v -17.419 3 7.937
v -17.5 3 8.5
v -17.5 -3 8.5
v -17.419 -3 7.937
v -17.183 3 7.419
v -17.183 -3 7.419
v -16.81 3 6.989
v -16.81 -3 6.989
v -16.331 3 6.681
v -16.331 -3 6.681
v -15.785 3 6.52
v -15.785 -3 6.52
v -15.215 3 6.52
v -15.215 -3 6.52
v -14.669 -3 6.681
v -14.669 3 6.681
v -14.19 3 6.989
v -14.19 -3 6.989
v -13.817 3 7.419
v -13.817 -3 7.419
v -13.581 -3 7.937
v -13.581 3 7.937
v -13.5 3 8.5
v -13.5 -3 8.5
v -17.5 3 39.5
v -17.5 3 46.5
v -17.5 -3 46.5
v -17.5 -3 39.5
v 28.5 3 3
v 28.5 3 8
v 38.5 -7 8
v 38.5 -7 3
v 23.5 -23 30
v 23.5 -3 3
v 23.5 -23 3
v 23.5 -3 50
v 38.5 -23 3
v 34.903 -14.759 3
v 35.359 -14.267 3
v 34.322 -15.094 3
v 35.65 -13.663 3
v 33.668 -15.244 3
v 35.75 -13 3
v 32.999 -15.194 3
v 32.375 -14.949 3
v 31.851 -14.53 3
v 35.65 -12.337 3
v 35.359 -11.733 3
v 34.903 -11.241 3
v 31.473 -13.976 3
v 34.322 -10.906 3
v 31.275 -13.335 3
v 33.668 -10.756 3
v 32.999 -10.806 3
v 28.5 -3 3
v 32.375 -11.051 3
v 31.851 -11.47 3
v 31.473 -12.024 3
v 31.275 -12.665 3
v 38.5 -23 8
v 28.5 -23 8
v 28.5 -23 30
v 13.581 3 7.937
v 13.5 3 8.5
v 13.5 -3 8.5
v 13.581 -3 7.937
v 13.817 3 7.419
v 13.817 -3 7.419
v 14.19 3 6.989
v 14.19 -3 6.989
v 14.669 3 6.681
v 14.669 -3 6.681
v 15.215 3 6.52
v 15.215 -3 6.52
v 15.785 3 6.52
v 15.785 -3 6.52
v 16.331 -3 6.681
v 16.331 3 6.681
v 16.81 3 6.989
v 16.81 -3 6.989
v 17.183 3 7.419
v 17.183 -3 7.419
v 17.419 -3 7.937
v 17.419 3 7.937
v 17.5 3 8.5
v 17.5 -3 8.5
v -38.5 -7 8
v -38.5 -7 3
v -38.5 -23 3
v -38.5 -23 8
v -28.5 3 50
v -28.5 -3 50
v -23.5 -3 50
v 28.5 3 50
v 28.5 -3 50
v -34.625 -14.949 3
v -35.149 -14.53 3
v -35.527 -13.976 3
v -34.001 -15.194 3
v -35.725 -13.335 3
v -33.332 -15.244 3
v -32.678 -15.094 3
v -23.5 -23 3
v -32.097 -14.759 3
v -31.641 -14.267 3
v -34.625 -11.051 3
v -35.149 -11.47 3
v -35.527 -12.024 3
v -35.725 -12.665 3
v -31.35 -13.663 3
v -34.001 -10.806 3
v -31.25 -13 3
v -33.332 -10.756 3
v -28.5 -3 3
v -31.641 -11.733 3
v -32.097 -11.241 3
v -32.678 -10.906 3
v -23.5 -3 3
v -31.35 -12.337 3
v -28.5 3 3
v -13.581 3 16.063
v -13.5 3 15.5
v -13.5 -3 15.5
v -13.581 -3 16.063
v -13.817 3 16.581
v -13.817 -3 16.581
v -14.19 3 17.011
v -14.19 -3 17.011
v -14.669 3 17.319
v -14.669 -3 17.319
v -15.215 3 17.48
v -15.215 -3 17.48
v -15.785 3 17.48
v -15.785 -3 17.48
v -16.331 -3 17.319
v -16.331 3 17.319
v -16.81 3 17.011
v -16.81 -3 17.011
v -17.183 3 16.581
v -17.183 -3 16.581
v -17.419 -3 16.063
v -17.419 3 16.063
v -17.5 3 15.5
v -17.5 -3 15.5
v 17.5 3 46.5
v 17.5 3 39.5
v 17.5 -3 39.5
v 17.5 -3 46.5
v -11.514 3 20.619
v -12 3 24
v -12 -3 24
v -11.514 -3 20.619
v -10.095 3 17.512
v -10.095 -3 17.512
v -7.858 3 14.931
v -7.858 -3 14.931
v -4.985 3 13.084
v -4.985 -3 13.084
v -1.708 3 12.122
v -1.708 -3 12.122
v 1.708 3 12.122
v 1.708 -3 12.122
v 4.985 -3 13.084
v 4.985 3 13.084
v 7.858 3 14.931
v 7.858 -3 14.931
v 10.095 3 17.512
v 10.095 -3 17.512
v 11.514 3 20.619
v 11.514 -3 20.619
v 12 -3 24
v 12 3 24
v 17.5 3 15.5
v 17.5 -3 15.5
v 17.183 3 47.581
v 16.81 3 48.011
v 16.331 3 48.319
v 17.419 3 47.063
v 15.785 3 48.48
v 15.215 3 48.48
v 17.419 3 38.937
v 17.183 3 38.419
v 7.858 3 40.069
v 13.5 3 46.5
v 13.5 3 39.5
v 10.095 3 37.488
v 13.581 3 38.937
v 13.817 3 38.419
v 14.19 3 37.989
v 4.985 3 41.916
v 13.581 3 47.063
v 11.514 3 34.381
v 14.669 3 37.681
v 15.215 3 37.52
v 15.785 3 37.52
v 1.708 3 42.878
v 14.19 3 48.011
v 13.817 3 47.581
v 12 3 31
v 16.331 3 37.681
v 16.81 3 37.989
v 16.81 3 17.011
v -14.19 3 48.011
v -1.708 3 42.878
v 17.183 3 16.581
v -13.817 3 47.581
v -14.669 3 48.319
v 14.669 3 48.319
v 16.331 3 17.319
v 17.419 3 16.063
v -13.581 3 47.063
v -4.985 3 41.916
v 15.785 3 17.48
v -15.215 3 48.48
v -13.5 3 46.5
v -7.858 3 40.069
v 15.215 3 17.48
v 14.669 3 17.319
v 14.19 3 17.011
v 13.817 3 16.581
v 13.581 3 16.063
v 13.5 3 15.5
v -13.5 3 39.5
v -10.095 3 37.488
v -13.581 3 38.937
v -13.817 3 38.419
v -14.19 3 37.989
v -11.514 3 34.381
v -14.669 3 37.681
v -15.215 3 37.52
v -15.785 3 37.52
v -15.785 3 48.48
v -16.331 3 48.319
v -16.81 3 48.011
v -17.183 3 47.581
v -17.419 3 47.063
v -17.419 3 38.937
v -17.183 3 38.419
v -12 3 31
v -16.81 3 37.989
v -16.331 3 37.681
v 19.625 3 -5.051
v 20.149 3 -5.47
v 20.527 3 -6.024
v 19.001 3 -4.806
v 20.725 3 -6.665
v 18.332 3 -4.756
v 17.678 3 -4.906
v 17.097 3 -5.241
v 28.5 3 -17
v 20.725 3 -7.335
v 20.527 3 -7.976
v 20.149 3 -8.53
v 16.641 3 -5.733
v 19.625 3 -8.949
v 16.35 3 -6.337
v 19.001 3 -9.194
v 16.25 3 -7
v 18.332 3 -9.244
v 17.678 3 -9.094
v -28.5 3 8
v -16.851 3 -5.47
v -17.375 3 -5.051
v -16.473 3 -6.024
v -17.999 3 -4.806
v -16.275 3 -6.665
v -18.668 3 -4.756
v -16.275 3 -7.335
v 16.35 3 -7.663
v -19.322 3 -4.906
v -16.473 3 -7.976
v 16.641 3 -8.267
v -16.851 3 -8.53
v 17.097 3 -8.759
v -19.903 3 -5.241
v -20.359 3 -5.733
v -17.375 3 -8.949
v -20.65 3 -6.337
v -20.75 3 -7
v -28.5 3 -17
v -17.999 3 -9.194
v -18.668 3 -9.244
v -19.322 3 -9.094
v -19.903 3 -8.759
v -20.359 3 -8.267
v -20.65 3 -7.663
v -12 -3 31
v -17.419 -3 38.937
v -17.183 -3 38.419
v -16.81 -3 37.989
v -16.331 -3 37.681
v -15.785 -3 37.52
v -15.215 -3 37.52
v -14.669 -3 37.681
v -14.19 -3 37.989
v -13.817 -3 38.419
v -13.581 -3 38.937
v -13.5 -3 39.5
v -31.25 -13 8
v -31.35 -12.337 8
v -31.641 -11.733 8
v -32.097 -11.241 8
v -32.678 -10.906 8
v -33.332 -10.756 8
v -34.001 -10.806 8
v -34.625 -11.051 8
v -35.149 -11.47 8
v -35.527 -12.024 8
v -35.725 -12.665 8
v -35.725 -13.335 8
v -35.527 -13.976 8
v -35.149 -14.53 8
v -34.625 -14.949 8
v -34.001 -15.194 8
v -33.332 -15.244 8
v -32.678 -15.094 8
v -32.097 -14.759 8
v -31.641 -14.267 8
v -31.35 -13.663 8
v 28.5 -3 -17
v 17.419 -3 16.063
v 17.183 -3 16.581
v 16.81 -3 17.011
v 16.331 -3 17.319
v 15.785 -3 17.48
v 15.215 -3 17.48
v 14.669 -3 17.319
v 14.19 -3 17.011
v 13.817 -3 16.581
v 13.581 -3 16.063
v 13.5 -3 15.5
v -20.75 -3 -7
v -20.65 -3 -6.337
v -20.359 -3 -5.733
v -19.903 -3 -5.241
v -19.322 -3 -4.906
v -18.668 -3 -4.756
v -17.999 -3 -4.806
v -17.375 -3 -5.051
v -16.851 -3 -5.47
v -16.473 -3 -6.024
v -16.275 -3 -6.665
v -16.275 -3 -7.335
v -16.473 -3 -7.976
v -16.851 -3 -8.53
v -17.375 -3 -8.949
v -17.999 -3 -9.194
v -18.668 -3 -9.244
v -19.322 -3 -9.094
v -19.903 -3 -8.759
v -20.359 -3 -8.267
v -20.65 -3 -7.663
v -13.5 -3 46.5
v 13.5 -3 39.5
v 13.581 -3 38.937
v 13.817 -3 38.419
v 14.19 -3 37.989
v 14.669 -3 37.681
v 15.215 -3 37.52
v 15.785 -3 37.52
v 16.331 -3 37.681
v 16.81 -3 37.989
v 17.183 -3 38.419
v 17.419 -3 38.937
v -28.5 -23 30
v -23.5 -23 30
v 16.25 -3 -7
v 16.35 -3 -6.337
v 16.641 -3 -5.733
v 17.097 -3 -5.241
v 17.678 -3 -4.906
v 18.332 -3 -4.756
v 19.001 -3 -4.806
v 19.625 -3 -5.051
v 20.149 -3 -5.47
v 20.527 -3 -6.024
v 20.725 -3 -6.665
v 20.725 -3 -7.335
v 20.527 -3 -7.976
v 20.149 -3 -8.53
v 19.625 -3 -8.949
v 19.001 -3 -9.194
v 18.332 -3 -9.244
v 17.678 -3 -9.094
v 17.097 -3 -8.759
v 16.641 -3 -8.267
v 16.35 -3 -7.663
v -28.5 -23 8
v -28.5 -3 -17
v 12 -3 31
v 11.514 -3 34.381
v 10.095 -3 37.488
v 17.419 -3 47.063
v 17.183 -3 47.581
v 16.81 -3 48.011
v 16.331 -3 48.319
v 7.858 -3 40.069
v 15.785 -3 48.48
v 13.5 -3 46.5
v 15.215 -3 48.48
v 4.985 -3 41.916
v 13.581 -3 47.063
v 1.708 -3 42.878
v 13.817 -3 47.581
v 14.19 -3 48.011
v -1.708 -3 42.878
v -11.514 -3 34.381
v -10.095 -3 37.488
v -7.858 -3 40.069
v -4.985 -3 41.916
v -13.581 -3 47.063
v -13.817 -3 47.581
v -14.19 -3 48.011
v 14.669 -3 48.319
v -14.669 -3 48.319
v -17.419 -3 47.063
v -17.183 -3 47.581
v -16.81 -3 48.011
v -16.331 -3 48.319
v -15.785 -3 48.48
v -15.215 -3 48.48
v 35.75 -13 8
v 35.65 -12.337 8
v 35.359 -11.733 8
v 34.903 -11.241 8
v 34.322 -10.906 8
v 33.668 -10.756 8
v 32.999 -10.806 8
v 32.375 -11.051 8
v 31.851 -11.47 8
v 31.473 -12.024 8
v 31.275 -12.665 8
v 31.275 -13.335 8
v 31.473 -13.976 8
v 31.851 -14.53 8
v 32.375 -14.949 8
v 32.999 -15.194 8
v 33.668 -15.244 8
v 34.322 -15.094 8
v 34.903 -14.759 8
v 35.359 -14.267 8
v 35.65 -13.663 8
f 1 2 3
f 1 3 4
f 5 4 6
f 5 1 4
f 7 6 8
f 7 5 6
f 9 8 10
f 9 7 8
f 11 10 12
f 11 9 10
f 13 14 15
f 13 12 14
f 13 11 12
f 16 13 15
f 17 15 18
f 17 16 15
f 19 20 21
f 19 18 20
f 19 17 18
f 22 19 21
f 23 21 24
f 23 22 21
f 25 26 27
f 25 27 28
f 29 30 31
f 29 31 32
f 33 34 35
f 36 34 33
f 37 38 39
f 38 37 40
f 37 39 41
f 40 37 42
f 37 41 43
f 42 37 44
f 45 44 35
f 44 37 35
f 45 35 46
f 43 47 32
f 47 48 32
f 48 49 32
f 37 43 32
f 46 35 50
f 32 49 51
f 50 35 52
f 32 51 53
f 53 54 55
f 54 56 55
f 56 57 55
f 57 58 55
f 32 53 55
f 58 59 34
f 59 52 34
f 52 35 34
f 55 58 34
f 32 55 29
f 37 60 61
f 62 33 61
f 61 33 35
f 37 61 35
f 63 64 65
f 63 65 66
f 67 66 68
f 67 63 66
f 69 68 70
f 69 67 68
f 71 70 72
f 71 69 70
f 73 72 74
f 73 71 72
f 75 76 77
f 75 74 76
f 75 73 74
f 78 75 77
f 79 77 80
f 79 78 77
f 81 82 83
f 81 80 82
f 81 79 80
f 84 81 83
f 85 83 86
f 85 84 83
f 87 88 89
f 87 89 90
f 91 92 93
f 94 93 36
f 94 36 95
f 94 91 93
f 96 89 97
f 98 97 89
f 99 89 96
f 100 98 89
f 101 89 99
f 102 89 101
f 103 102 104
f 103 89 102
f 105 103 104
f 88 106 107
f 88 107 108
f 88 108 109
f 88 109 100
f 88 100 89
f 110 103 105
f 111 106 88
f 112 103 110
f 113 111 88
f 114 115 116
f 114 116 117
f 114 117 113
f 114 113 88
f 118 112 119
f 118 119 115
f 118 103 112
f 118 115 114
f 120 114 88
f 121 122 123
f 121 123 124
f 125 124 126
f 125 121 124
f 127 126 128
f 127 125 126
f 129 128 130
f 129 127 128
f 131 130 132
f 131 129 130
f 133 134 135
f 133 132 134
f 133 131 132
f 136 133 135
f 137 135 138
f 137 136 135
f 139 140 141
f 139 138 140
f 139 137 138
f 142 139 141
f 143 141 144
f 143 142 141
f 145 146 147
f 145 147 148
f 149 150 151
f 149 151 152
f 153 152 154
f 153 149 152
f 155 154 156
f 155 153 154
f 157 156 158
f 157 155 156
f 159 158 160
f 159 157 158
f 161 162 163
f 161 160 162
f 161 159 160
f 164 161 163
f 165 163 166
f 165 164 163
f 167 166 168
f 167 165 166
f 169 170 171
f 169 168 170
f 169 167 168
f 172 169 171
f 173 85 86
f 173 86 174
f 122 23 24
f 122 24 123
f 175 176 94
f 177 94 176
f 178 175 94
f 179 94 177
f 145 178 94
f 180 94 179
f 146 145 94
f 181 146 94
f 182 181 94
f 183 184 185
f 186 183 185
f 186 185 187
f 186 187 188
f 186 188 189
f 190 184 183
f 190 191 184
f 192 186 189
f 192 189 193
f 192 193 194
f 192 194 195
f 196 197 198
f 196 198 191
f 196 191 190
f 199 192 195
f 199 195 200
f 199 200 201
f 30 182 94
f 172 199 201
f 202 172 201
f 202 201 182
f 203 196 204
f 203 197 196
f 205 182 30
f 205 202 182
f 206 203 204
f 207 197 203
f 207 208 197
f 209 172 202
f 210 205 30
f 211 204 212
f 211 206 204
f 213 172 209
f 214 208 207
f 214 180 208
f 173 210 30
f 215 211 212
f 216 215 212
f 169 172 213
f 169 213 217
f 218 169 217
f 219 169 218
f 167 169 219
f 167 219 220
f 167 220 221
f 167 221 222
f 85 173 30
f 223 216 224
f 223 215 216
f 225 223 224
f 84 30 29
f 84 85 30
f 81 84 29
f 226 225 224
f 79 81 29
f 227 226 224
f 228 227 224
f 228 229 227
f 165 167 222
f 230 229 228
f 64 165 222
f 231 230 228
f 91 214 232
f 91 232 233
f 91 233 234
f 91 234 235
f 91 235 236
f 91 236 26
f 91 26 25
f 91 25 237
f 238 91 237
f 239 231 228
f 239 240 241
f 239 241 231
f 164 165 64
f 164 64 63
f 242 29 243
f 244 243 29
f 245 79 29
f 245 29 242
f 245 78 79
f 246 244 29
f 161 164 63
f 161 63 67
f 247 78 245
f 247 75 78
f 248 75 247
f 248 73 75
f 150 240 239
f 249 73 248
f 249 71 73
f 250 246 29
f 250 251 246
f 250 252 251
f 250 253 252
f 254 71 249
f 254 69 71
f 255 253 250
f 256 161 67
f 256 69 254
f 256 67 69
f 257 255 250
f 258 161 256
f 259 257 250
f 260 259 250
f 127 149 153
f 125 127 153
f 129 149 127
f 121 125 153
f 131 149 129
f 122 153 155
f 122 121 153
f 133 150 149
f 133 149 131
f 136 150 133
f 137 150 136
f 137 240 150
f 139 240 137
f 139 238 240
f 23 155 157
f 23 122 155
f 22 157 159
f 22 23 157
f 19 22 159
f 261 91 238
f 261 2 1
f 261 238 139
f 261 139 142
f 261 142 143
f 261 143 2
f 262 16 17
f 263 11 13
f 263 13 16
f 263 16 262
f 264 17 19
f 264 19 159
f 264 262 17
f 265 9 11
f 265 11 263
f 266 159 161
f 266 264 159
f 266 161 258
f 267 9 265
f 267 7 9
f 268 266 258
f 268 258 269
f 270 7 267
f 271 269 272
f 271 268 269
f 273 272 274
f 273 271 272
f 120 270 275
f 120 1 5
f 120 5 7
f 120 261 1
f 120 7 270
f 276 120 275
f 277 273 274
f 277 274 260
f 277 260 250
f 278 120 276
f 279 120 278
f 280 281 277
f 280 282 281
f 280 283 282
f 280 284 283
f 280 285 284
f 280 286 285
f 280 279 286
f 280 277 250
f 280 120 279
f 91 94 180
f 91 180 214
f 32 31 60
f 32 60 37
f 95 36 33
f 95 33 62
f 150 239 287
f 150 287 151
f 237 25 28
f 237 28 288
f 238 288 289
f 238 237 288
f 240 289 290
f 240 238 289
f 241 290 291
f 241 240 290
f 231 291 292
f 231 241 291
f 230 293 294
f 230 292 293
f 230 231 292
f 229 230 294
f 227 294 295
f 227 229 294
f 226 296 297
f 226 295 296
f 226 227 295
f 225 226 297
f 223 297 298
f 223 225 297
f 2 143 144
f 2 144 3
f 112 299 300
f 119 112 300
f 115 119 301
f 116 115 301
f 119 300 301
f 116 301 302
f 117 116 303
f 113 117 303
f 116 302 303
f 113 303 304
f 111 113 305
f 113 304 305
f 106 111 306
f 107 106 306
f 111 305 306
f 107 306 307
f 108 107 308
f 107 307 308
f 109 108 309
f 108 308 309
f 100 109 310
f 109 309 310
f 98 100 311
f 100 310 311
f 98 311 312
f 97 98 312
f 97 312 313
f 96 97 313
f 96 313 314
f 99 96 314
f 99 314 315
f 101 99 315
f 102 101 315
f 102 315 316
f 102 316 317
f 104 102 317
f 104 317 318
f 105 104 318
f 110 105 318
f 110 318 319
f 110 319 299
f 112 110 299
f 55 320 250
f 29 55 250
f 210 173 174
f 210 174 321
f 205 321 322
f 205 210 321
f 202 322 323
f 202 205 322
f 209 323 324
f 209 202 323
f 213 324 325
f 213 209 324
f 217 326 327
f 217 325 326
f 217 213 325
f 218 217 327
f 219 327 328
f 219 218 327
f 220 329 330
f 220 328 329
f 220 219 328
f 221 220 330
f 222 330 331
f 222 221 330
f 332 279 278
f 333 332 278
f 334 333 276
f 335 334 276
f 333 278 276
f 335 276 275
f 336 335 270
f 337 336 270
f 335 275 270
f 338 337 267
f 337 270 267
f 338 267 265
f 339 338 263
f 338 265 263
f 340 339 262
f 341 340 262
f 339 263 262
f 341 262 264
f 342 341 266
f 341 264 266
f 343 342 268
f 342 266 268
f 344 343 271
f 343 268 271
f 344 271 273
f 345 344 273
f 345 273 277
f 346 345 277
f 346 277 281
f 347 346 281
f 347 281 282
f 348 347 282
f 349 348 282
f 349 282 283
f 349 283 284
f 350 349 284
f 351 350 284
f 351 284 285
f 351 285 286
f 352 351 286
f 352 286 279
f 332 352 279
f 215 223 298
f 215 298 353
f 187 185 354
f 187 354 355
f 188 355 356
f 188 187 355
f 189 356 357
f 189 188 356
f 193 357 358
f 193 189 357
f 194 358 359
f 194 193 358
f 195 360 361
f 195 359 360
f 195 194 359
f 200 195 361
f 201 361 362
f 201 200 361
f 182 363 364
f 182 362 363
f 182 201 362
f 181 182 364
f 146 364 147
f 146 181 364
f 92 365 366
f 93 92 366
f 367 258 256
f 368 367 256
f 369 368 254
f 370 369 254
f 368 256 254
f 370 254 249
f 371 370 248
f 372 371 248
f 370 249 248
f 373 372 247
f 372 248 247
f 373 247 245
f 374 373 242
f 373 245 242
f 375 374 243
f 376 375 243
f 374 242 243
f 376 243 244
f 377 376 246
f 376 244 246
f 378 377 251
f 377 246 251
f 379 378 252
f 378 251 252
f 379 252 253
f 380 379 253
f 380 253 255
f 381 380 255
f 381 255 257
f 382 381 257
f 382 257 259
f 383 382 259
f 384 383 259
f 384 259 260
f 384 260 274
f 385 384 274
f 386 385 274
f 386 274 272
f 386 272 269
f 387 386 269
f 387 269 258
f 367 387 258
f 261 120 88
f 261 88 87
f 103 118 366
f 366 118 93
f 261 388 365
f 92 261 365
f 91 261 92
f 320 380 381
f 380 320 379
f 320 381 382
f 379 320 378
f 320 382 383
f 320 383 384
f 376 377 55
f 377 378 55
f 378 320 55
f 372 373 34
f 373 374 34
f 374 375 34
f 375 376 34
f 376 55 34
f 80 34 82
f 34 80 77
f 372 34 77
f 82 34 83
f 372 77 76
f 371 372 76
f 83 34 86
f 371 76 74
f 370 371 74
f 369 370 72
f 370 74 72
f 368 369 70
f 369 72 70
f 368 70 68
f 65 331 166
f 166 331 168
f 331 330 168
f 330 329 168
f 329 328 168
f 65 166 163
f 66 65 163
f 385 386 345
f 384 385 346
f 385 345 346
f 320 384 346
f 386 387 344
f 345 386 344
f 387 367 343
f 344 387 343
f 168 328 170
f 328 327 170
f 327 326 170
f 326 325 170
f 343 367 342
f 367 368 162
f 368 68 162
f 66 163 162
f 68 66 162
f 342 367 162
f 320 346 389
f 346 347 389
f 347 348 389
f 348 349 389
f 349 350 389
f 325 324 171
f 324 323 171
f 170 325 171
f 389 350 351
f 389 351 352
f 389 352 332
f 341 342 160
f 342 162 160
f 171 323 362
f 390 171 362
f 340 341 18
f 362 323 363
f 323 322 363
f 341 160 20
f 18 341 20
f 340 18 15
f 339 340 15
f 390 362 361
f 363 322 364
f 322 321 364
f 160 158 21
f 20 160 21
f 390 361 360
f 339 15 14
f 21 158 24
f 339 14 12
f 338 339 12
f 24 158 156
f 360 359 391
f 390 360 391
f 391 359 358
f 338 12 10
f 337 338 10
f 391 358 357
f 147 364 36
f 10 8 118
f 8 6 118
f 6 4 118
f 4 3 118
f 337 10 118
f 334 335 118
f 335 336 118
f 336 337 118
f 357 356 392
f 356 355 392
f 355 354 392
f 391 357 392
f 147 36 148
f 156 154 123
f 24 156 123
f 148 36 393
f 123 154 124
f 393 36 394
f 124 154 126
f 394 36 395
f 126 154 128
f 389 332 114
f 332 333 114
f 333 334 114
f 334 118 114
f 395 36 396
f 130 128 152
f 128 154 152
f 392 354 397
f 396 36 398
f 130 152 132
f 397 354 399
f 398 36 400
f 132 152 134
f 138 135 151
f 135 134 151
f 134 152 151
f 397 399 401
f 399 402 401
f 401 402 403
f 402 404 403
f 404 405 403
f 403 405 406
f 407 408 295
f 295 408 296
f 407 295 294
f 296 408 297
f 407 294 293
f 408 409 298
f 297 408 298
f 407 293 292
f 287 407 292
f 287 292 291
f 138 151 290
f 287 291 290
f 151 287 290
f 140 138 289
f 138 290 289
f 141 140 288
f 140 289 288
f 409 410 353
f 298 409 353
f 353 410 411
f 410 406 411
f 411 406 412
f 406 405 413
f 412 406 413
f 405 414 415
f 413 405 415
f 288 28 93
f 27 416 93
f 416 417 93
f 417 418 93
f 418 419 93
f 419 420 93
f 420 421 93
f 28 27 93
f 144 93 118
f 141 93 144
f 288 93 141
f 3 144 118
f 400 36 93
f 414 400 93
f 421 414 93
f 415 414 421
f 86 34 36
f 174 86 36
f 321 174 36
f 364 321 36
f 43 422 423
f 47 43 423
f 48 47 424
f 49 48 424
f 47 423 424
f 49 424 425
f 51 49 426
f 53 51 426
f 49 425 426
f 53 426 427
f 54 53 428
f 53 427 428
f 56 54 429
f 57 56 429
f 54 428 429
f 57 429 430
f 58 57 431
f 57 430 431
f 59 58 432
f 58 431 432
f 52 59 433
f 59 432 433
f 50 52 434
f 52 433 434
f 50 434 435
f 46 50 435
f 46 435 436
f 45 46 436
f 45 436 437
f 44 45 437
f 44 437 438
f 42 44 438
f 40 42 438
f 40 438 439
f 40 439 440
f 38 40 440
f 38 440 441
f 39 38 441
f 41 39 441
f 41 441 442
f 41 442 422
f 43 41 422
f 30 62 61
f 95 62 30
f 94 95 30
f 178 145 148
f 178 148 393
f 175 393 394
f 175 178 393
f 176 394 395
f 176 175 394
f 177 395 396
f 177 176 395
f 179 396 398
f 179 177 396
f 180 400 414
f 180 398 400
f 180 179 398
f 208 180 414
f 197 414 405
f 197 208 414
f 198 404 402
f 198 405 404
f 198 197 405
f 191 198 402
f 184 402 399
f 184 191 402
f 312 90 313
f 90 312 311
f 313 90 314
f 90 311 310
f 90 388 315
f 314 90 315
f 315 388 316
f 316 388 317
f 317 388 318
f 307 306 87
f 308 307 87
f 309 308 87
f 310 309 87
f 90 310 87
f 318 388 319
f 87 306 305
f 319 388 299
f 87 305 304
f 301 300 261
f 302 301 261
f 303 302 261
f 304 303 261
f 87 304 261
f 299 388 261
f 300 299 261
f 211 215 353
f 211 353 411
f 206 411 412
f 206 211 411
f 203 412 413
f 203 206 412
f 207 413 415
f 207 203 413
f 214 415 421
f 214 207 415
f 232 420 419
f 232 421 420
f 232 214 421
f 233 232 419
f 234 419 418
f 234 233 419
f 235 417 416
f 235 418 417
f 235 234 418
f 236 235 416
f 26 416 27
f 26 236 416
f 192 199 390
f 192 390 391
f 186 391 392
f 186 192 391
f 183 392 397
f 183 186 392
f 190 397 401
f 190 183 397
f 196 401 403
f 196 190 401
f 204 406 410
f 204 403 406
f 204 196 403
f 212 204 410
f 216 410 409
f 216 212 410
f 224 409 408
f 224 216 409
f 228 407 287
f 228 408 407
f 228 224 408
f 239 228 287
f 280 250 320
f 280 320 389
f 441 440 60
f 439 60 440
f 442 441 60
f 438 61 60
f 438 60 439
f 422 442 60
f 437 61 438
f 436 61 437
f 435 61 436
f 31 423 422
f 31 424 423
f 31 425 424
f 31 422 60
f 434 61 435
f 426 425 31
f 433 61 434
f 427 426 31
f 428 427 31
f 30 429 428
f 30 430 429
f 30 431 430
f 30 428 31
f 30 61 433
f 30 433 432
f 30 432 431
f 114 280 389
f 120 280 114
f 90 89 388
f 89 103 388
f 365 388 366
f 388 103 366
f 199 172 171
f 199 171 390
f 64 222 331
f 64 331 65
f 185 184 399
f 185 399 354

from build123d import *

# Parameters (mm, degrees)
SKETCH1_W           = 57
SKETCH1_H           = 6
BOSS_EXTRUDE1_DEPTH = 50
CUT_EXTRUDE2_DEPTH  = 10
SKETCH4_W           = 57
SKETCH4_H           = 6
BOSS_EXTRUDE2_DEPTH = 17
SKETCH6_R           = 2.25
CUT_EXTRUDE3_DEPTH  = 20
SKETCH8_W           = 5
SKETCH8_H           = 47
BOSS_EXTRUDE4_DEPTH = 20
CHAMFER1_SIZE       = 20
SKETCH9_W           = 5
SKETCH9_H           = 26
BOSS_EXTRUDE5_DEPTH = 10
SKETCH10_W          = 5
SKETCH10_H          = 26
BOSS_EXTRUDE6_DEPTH = 10
CHAMFER2_SIZE       = 10
SKETCH11_R          = 2.25
CUT_EXTRUDE4_DEPTH  = 10


with BuildPart() as part:
    # Sketch1 → Boss-Extrude1 (new body)
    with BuildSketch(Plane.XY):
        Rectangle(SKETCH1_W, SKETCH1_H)
    extrude(amount=BOSS_EXTRUDE1_DEPTH)

    # Sketch3 → Cut-Extrude2 (cut)
    with BuildSketch(Plane(origin=(0, 3, 0), x_dir=(1, 0, 0), z_dir=(0, 1, 0))):
        with BuildLine():
            Line((-13.5, -8.5), (-13.5, -15.5))
            ThreePointArc((-13.5, -15.5), (-15.5, -17.5), (-17.5, -15.5))
            Line((-17.5, -15.5), (-17.5, -8.5))
            ThreePointArc((-17.5, -8.5), (-15.5, -6.5), (-13.5, -8.5))
        make_face()
        with BuildLine():
            Line((-13.5, -39.5), (-13.5, -46.5))
            ThreePointArc((-13.5, -46.5), (-15.5, -48.5), (-17.5, -46.5))
            Line((-17.5, -46.5), (-17.5, -39.5))
            ThreePointArc((-17.5, -39.5), (-15.5, -37.5), (-13.5, -39.5))
        make_face()
        with BuildLine():
            Line((17.5, -39.5), (17.5, -46.5))
            ThreePointArc((17.5, -46.5), (15.5, -48.5), (13.5, -46.5))
            Line((13.5, -46.5), (13.5, -39.5))
            ThreePointArc((13.5, -39.5), (15.5, -37.5), (17.5, -39.5))
        make_face()
        with BuildLine():
            Line((17.5, -8.5), (17.5, -15.5))
            ThreePointArc((17.5, -15.5), (15.5, -17.5), (13.5, -15.5))
            Line((13.5, -15.5), (13.5, -8.5))
            ThreePointArc((13.5, -8.5), (15.5, -6.5), (17.5, -8.5))
        make_face()
        with BuildLine():
            Line((12, -24), (12, -31))
            ThreePointArc((12, -31), (0, -43), (-12, -31))
            Line((-12, -31), (-12, -24))
            ThreePointArc((-12, -24), (0, -12), (12, -24))
        make_face()
    extrude(amount=-CUT_EXTRUDE2_DEPTH, mode=Mode.SUBTRACT)

    # Sketch4 → Boss-Extrude2 (add)
    with BuildSketch(Plane(origin=(0, 0, 0), x_dir=(-1, 0, 0), z_dir=(0, 0, -1))):
        Rectangle(SKETCH4_W, SKETCH4_H)
    extrude(amount=BOSS_EXTRUDE2_DEPTH)

    # Sketch6 → Cut-Extrude3 (cut)
    with BuildSketch(Plane(origin=(0, 3, 0), x_dir=(1, 0, 0), z_dir=(0, 1, 0))):
        with Locations(Location((-18.5, 7, 0), (0, 0, 180))):
            Circle(SKETCH6_R)
        with Locations(Location((18.5, 7, 0), (0, 0, 180))):
            Circle(SKETCH6_R)
    extrude(amount=-CUT_EXTRUDE3_DEPTH, mode=Mode.SUBTRACT)

    # Sketch8 → Boss-Extrude4 (add)
    with BuildSketch(Plane.XZ.offset(3)):
        with Locations((-26, 26.5)):
            Rectangle(SKETCH8_W, SKETCH8_H)
        with Locations((26, 26.5)):
            Rectangle(SKETCH8_W, SKETCH8_H)
    extrude(amount=BOSS_EXTRUDE4_DEPTH)

    # Chamfer1
    chamfer1_edges = [part.edges().sort_by_distance(p)[0] for p in [
        (26, -23, 50),
        (-26, -23, 50),
    ]]
    chamfer(chamfer1_edges, length=CHAMFER1_SIZE)

    # Sketch9 → Boss-Extrude5 (add)
    with BuildSketch(Plane.ZY.offset(28.5)):
        with Locations((5.5, -10)):
            Rectangle(SKETCH9_W, SKETCH9_H)
    extrude(amount=BOSS_EXTRUDE5_DEPTH)

    # Sketch10 → Boss-Extrude6 (add)
    with BuildSketch(Plane(origin=(28.5, 0, 0), x_dir=(0, 0, -1), z_dir=(1, 0, 0))):
        with Locations((-5.5, -10)):
            Rectangle(SKETCH10_W, SKETCH10_H)
    extrude(amount=BOSS_EXTRUDE6_DEPTH)

    # Chamfer2
    chamfer2_edges = [part.edges().sort_by_distance(p)[0] for p in [
        (38.5, 3, 5.5),
        (-38.5, 3, 5.5),
    ]]
    chamfer(chamfer2_edges, length=CHAMFER2_SIZE)

    # Sketch11 → Cut-Extrude4 (cut)
    with BuildSketch(Plane.XY.offset(8)):
        with Locations((-33.5, -13)):
            Circle(SKETCH11_R)
        with Locations((33.5, -13)):
            Circle(SKETCH11_R)
    extrude(amount=-CUT_EXTRUDE4_DEPTH, mode=Mode.SUBTRACT)


solid = part.part
